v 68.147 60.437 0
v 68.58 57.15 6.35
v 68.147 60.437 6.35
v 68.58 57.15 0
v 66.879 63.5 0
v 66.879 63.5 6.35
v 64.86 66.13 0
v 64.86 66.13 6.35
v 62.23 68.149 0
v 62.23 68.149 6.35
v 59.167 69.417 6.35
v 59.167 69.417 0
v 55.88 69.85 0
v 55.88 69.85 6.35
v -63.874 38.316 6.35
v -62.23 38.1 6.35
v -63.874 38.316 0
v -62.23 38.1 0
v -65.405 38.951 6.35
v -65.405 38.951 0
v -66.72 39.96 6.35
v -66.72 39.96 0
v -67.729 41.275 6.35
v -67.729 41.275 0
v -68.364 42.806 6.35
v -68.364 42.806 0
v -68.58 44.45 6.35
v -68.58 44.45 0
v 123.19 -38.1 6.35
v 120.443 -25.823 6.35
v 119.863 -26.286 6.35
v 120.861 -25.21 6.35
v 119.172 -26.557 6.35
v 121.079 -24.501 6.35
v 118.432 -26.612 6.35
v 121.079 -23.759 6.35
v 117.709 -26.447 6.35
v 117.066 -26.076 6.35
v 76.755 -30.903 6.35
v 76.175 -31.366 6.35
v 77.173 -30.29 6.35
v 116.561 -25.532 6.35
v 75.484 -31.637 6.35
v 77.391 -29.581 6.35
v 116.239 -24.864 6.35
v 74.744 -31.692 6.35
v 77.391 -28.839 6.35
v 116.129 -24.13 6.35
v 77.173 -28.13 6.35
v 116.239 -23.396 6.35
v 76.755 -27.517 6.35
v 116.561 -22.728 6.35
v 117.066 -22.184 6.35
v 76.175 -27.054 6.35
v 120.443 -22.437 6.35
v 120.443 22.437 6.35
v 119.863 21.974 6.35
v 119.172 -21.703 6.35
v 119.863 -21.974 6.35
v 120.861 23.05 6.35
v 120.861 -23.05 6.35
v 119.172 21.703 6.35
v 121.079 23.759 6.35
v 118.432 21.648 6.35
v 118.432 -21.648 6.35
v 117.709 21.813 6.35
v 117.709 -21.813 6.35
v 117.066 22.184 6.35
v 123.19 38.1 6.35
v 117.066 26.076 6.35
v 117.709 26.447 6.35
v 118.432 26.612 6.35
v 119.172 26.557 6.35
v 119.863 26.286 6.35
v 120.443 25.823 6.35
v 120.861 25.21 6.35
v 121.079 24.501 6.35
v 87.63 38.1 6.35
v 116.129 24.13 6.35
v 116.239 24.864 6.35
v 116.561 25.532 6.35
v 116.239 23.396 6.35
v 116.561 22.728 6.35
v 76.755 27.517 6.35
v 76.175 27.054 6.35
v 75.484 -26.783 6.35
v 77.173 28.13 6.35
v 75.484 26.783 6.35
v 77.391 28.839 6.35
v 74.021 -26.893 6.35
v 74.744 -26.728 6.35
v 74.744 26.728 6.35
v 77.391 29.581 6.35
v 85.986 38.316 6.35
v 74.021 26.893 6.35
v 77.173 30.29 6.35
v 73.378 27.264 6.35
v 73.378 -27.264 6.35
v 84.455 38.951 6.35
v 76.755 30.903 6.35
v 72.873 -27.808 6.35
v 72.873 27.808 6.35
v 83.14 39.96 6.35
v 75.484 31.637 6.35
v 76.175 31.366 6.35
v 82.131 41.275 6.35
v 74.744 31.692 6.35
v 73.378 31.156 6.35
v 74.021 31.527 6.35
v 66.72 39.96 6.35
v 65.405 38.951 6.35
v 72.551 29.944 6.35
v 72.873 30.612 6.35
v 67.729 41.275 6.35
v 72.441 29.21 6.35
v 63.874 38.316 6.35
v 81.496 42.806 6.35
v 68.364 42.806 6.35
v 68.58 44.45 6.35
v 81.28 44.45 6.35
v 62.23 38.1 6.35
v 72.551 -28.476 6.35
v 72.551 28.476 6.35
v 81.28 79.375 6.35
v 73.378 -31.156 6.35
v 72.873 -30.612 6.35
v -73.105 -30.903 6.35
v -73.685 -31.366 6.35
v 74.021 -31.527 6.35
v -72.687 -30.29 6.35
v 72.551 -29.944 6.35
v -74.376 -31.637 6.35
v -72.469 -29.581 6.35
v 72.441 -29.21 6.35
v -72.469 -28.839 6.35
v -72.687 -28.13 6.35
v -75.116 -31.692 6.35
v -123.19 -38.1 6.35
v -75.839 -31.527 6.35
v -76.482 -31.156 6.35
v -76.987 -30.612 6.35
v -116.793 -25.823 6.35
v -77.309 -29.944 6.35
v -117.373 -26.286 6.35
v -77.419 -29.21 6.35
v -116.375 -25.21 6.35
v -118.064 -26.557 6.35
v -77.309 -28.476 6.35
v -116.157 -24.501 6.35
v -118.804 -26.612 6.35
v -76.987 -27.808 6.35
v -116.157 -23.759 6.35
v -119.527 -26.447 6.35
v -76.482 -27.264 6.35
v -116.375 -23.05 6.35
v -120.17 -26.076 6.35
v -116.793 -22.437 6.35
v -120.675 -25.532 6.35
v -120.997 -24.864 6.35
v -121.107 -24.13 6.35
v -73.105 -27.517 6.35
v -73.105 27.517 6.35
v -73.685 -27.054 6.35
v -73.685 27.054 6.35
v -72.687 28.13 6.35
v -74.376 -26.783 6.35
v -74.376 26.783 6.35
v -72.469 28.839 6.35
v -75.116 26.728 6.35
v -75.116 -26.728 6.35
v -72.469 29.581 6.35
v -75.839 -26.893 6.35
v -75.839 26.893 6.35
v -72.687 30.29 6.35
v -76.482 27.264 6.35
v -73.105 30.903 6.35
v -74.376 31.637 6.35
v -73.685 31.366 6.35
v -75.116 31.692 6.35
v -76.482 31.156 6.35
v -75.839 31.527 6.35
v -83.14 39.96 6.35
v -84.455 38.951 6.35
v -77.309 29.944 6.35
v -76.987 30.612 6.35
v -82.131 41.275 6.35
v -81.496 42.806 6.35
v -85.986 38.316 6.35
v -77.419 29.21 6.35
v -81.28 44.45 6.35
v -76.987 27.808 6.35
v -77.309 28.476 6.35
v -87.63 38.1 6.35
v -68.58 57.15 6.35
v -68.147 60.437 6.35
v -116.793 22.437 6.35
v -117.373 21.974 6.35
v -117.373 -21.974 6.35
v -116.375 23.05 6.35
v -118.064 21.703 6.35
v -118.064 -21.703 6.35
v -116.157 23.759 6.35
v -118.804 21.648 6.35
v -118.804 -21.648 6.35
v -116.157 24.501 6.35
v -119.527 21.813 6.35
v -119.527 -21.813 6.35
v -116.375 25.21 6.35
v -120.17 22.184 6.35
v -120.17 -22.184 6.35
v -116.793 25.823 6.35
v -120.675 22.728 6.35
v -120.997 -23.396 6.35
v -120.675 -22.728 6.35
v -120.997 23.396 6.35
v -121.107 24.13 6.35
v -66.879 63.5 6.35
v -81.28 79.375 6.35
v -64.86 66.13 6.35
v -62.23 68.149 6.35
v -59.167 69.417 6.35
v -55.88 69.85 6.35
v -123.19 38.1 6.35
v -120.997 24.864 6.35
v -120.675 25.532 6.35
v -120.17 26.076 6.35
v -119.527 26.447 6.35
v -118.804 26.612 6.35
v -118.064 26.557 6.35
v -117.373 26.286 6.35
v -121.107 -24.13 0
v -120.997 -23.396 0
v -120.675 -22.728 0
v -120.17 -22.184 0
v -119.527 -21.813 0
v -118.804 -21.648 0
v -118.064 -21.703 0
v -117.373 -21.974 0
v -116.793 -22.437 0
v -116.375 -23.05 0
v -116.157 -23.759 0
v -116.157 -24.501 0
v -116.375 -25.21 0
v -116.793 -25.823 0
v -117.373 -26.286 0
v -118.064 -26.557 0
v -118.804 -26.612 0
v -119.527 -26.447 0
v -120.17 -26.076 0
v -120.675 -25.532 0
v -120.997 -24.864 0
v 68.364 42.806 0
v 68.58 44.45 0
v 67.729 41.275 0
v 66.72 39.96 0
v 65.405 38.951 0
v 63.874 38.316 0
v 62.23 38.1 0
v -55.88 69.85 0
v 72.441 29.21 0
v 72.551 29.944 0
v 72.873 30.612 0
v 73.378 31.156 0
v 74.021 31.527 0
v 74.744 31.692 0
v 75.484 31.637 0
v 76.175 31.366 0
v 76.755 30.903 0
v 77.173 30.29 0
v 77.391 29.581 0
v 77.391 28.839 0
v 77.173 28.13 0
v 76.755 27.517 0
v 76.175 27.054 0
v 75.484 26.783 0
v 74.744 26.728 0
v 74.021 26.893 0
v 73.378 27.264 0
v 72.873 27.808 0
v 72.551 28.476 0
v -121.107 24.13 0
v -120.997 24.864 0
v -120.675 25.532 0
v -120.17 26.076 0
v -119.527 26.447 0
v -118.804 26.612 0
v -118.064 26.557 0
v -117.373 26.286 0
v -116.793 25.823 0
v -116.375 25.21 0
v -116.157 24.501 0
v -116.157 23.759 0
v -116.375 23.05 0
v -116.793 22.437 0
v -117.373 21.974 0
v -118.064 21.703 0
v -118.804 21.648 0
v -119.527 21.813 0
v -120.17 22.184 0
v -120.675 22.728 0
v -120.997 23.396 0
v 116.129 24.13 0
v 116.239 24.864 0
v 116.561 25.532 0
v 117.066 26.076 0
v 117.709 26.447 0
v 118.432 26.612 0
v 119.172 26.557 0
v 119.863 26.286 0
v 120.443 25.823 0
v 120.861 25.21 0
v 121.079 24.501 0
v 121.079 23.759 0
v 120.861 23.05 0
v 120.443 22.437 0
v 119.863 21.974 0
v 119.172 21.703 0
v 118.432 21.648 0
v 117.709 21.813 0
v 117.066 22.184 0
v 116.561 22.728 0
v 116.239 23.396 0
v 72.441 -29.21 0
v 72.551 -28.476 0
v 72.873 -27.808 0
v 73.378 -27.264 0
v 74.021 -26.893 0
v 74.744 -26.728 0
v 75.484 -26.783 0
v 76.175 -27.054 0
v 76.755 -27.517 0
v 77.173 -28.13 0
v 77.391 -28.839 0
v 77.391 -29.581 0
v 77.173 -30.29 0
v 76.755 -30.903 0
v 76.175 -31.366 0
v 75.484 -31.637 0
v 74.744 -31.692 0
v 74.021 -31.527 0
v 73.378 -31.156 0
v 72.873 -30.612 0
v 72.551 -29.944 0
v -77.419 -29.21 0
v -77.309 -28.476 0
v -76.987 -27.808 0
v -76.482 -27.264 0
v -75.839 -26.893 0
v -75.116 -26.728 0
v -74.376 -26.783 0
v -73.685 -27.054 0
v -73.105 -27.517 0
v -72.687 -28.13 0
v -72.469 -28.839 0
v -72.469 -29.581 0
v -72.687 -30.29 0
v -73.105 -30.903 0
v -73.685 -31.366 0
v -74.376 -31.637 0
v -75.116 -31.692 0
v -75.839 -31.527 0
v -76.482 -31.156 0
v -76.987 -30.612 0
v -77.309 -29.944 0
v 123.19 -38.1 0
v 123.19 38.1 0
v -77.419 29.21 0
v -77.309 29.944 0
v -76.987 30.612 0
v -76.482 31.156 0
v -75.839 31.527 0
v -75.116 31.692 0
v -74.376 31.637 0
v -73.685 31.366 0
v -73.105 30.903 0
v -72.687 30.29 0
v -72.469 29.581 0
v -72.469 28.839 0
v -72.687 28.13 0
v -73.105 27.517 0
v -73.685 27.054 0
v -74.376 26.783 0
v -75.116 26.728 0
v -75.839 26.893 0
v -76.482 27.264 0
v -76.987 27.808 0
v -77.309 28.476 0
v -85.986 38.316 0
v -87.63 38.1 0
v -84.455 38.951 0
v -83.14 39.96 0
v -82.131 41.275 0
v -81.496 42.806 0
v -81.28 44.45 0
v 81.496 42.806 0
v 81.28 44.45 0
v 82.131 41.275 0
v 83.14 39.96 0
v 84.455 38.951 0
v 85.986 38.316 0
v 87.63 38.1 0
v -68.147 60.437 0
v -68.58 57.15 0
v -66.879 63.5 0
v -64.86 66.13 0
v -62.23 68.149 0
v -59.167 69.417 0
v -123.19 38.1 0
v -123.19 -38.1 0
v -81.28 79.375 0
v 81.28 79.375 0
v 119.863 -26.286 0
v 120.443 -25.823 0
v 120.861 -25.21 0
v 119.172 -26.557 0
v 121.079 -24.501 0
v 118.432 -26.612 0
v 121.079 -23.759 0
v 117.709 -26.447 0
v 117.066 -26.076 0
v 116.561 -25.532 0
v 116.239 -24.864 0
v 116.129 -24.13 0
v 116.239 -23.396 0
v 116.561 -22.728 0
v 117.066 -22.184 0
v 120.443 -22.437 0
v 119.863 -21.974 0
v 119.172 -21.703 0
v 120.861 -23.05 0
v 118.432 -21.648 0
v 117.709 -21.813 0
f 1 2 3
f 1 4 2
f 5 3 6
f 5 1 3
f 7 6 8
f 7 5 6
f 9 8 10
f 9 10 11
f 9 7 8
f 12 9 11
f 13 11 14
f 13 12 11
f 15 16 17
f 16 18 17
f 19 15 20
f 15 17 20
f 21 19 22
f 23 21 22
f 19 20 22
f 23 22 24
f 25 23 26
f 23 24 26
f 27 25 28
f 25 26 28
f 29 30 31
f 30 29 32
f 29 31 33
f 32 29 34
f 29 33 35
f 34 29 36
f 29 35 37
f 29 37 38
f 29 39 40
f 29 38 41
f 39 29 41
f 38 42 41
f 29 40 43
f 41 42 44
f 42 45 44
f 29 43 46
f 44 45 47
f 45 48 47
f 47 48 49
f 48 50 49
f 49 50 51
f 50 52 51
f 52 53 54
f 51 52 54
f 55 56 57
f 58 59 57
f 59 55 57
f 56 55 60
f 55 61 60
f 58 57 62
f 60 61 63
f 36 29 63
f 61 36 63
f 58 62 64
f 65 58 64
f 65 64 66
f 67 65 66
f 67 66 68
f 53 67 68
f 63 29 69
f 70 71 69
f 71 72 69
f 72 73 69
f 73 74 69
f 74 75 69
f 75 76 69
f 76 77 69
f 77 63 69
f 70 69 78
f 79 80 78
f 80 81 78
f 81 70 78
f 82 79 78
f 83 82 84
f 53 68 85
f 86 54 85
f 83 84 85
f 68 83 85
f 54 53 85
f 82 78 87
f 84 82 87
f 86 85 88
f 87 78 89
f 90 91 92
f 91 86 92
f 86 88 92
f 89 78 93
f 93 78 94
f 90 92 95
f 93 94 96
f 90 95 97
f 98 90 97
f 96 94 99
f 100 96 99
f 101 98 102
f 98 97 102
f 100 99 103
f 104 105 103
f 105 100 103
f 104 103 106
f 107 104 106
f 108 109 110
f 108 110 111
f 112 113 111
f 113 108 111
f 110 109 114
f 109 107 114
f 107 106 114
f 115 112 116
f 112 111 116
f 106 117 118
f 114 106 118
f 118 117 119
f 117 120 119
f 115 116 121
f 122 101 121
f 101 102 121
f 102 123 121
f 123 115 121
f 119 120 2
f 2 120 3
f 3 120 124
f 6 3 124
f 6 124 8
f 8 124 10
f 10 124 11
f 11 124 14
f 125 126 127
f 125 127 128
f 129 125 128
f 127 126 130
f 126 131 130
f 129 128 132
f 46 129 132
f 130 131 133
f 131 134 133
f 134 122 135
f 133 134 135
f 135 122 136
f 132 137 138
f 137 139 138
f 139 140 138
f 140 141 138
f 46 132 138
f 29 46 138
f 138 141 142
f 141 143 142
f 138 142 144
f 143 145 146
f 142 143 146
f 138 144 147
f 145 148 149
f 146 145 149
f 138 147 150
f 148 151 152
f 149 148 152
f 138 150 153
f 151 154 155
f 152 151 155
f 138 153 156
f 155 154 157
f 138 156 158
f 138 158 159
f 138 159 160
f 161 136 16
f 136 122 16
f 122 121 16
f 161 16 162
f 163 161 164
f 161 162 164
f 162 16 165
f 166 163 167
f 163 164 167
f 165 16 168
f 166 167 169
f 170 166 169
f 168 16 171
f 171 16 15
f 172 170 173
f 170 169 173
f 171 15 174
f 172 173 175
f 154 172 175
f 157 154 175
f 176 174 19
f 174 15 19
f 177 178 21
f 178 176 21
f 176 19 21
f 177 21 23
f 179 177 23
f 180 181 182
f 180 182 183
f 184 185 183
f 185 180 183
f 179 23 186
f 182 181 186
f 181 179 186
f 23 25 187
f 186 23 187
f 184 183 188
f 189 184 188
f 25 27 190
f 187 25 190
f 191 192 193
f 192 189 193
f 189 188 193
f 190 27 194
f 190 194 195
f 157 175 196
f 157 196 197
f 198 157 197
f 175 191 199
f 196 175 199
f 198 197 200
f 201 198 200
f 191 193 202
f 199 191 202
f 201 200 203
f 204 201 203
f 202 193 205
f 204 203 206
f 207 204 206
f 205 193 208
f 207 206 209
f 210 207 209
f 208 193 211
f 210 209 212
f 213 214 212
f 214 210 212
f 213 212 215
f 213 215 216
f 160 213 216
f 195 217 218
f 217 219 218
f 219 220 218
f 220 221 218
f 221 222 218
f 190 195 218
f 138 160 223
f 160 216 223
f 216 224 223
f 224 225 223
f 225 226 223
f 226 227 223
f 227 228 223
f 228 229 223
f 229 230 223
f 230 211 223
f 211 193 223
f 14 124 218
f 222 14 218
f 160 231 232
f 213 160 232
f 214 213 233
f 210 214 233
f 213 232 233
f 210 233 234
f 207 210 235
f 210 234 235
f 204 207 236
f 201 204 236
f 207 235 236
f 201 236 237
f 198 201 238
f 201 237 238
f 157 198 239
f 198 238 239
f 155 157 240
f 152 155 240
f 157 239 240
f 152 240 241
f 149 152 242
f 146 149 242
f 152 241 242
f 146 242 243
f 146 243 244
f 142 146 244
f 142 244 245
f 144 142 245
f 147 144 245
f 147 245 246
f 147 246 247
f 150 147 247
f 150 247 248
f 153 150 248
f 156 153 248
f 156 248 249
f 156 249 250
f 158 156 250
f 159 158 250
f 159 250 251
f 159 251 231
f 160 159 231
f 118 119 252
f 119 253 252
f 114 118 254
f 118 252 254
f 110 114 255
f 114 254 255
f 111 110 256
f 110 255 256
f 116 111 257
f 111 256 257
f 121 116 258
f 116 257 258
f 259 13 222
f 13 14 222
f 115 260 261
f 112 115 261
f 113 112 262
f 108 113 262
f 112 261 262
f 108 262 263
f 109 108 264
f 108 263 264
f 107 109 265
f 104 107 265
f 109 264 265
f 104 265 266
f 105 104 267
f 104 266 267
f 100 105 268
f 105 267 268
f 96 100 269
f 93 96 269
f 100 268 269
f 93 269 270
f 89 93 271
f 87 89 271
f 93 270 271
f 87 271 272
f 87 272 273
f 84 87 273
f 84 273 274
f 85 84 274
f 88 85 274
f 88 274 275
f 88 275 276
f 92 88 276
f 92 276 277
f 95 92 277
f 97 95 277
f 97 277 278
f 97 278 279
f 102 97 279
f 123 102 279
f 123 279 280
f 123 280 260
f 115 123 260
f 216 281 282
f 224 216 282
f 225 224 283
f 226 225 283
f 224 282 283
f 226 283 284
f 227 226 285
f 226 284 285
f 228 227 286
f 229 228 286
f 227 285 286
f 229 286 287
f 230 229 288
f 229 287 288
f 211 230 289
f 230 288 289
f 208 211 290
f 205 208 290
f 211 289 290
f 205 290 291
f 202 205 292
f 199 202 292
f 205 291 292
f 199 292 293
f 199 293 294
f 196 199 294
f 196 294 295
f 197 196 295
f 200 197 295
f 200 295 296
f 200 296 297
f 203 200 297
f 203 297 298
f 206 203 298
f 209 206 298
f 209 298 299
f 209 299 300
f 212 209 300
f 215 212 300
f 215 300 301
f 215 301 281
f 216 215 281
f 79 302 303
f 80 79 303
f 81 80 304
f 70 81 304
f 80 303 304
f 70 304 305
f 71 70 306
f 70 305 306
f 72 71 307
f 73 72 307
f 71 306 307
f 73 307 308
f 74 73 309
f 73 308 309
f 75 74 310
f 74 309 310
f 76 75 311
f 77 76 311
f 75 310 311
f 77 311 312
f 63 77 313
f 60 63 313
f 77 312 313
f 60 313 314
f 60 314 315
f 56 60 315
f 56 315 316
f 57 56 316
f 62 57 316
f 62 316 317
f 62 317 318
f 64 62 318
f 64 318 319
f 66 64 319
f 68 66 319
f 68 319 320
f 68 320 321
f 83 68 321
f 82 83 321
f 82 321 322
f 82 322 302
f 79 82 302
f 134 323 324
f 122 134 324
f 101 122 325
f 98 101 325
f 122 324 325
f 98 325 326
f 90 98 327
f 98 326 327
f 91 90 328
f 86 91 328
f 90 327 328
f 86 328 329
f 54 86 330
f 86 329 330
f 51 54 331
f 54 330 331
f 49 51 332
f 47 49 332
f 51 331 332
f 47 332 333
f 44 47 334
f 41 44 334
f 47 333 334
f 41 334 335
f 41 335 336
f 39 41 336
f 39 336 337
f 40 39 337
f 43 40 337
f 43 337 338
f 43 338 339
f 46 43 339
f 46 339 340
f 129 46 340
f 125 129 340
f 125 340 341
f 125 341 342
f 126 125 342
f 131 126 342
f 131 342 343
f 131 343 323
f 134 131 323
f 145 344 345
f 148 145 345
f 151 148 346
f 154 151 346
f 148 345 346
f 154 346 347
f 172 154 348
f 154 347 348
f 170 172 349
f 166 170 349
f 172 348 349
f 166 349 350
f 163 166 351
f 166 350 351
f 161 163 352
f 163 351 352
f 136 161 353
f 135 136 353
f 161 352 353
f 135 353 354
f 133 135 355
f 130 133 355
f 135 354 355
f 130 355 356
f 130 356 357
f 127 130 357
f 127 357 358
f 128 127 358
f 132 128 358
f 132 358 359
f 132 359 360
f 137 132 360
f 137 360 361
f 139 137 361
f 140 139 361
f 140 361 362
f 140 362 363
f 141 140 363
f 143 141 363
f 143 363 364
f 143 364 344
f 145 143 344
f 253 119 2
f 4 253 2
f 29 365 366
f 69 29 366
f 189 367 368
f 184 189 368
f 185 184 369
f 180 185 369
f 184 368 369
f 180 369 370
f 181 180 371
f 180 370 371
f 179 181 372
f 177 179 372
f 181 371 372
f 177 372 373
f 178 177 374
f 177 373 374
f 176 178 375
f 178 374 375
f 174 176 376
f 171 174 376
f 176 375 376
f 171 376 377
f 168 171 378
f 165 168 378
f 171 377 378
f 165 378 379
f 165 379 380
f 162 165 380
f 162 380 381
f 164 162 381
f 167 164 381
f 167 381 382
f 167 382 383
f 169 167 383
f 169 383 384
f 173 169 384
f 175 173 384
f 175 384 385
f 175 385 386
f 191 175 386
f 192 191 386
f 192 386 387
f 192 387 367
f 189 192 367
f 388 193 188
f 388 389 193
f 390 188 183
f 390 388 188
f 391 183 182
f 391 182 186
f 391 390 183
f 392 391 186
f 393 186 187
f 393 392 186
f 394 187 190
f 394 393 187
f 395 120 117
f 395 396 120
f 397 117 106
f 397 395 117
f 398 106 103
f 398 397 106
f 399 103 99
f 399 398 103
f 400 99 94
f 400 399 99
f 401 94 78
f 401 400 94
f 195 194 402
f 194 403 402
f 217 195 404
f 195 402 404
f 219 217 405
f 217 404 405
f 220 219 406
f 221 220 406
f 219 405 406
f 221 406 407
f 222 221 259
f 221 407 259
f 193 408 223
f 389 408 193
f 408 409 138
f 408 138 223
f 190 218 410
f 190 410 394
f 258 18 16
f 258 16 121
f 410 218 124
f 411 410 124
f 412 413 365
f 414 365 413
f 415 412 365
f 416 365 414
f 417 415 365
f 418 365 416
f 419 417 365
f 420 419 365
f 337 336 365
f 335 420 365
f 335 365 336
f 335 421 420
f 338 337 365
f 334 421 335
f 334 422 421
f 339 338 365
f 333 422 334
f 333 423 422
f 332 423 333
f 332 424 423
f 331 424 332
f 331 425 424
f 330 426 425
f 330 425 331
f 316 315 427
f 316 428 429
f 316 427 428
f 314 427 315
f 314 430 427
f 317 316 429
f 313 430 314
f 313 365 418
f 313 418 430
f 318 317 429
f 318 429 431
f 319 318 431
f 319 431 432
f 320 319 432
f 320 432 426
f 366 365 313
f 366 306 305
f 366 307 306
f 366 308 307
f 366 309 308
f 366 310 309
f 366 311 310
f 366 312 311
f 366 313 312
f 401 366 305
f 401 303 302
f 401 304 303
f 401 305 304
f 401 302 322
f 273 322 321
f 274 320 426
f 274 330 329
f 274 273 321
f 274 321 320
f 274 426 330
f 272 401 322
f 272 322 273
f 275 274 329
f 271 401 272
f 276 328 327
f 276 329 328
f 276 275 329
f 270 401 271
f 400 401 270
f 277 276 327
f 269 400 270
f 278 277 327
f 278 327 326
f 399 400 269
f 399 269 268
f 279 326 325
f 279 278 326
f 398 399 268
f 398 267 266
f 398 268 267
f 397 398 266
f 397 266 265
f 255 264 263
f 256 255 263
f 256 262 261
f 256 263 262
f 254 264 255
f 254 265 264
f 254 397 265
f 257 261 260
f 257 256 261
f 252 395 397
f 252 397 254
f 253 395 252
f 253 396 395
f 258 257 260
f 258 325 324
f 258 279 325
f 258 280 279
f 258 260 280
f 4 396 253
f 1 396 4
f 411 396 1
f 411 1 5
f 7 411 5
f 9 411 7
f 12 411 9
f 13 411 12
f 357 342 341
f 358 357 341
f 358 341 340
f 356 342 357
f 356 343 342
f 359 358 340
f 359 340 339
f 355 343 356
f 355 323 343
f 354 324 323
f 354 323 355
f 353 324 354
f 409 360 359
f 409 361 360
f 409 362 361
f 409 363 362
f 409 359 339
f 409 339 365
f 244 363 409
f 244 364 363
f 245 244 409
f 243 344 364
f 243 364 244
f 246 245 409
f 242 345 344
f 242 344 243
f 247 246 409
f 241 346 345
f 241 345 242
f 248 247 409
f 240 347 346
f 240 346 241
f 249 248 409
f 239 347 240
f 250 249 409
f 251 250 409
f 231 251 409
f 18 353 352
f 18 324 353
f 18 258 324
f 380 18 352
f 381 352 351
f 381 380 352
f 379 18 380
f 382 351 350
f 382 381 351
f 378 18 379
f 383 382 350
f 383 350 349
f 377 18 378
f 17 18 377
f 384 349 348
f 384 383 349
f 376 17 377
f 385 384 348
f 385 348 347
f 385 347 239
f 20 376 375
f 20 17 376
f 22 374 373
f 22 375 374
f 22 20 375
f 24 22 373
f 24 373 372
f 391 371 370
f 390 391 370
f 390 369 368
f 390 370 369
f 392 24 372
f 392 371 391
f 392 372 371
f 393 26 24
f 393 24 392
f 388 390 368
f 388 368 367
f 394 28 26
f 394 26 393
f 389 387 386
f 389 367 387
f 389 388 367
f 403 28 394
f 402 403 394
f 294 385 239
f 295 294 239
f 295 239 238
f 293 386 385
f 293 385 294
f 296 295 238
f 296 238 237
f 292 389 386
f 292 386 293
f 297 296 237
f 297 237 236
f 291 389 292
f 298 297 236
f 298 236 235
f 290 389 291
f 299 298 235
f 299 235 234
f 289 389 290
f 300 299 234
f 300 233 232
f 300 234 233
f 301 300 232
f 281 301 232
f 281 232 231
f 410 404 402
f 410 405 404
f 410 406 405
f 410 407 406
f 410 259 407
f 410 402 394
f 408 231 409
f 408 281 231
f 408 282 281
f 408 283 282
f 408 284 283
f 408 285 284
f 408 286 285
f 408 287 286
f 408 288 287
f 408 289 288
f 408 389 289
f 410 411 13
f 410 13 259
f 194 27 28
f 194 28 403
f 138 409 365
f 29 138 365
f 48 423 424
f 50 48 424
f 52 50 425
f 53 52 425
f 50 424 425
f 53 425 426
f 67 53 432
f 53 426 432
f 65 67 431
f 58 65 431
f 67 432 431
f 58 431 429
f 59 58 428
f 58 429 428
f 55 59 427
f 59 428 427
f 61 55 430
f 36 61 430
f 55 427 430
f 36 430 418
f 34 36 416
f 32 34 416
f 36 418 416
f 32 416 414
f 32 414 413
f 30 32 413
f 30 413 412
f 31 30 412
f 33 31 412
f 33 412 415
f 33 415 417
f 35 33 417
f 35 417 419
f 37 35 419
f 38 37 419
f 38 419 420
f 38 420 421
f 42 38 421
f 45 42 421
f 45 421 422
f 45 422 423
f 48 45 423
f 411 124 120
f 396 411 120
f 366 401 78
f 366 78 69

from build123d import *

# Parameters (mm, degrees)
SKETCH1_W              = 246.38
SKETCH1_H              = 76.2
BOSS_EXTRUDE1_DEPTH    = 6.35
F_10_CLEARANCE_HOLE1_D = 4.9784
BOSS_EXTRUDE2_DEPTH    = 6.35
FILLET1_R              = 12.7
FILLET1_OF_MIRROR1_R   = 12.7
FILLET2_R              = 6.35
FILLET3_R              = 6.35


with BuildPart() as part:
    # Sketch1 → Boss-Extrude1 (new body)
    with BuildSketch(Plane.XY):
        Rectangle(SKETCH1_W, SKETCH1_H)
    extrude(amount=BOSS_EXTRUDE1_DEPTH)

    # #10 Clearance Hole1 (through all)
    with Locations(Plane.XY.offset(6.35)):
        with Locations((-74.93, 29.21), (-74.93, -29.21), (74.93, 29.21), (74.93, -29.21), (-118.618, 24.13), (-118.618, -24.13), (118.618, 24.13), (118.618, -24.13)):
            Hole(F_10_CLEARANCE_HOLE1_D / 2)

    # Sketch5 → Boss-Extrude2 (add)
    with BuildSketch(Plane.XY.offset(6.35)):
        Polygon((-81.28, 47.271427301), (-81.28, 38.1), (-68.58, 38.1), (-68.58, 69.85), (-81.28, 69.85), align=None)
        Polygon((-81.28, 69.85), (-68.58, 69.85), (0, 69.85), (0, 79.375), (-81.28, 79.375), align=None)
    boss_extrude2 = extrude(amount=-BOSS_EXTRUDE2_DEPTH)

    # Fillet1
    fillet1_edges = [part.edges().sort_by_distance(p)[0] for p in [
        (-68.58, 69.85, 3.175),
    ]]
    fillet(fillet1_edges, radius=FILLET1_R)

    # Mirror1: Boss-Extrude2 across plane
    add(boss_extrude2.mirror(Plane(origin=(0, 0, 0), x_dir=(0, 0, 1), z_dir=(1, 0, 0))))

    # Fillet1 of Mirror1
    fillet1_of_mirror1_edges = [part.edges().sort_by_distance(p)[0] for p in [
        (68.58, 69.85, 3.175),
    ]]
    fillet(fillet1_of_mirror1_edges, radius=FILLET1_OF_MIRROR1_R)

    # Fillet2
    fillet2_edges = [part.edges().sort_by_distance(p)[0] for p in [
        (68.58, 38.1, 3.175),
        (-68.58, 38.1, 3.175),
    ]]
    fillet(fillet2_edges, radius=FILLET2_R)

    # Fillet3
    fillet3_edges = [part.edges().sort_by_distance(p)[0] for p in [
        (81.28, 38.1, 3.175),
        (-81.28, 38.1, 3.175),
    ]]
    fillet(fillet3_edges, radius=FILLET3_R)


solid = part.part
